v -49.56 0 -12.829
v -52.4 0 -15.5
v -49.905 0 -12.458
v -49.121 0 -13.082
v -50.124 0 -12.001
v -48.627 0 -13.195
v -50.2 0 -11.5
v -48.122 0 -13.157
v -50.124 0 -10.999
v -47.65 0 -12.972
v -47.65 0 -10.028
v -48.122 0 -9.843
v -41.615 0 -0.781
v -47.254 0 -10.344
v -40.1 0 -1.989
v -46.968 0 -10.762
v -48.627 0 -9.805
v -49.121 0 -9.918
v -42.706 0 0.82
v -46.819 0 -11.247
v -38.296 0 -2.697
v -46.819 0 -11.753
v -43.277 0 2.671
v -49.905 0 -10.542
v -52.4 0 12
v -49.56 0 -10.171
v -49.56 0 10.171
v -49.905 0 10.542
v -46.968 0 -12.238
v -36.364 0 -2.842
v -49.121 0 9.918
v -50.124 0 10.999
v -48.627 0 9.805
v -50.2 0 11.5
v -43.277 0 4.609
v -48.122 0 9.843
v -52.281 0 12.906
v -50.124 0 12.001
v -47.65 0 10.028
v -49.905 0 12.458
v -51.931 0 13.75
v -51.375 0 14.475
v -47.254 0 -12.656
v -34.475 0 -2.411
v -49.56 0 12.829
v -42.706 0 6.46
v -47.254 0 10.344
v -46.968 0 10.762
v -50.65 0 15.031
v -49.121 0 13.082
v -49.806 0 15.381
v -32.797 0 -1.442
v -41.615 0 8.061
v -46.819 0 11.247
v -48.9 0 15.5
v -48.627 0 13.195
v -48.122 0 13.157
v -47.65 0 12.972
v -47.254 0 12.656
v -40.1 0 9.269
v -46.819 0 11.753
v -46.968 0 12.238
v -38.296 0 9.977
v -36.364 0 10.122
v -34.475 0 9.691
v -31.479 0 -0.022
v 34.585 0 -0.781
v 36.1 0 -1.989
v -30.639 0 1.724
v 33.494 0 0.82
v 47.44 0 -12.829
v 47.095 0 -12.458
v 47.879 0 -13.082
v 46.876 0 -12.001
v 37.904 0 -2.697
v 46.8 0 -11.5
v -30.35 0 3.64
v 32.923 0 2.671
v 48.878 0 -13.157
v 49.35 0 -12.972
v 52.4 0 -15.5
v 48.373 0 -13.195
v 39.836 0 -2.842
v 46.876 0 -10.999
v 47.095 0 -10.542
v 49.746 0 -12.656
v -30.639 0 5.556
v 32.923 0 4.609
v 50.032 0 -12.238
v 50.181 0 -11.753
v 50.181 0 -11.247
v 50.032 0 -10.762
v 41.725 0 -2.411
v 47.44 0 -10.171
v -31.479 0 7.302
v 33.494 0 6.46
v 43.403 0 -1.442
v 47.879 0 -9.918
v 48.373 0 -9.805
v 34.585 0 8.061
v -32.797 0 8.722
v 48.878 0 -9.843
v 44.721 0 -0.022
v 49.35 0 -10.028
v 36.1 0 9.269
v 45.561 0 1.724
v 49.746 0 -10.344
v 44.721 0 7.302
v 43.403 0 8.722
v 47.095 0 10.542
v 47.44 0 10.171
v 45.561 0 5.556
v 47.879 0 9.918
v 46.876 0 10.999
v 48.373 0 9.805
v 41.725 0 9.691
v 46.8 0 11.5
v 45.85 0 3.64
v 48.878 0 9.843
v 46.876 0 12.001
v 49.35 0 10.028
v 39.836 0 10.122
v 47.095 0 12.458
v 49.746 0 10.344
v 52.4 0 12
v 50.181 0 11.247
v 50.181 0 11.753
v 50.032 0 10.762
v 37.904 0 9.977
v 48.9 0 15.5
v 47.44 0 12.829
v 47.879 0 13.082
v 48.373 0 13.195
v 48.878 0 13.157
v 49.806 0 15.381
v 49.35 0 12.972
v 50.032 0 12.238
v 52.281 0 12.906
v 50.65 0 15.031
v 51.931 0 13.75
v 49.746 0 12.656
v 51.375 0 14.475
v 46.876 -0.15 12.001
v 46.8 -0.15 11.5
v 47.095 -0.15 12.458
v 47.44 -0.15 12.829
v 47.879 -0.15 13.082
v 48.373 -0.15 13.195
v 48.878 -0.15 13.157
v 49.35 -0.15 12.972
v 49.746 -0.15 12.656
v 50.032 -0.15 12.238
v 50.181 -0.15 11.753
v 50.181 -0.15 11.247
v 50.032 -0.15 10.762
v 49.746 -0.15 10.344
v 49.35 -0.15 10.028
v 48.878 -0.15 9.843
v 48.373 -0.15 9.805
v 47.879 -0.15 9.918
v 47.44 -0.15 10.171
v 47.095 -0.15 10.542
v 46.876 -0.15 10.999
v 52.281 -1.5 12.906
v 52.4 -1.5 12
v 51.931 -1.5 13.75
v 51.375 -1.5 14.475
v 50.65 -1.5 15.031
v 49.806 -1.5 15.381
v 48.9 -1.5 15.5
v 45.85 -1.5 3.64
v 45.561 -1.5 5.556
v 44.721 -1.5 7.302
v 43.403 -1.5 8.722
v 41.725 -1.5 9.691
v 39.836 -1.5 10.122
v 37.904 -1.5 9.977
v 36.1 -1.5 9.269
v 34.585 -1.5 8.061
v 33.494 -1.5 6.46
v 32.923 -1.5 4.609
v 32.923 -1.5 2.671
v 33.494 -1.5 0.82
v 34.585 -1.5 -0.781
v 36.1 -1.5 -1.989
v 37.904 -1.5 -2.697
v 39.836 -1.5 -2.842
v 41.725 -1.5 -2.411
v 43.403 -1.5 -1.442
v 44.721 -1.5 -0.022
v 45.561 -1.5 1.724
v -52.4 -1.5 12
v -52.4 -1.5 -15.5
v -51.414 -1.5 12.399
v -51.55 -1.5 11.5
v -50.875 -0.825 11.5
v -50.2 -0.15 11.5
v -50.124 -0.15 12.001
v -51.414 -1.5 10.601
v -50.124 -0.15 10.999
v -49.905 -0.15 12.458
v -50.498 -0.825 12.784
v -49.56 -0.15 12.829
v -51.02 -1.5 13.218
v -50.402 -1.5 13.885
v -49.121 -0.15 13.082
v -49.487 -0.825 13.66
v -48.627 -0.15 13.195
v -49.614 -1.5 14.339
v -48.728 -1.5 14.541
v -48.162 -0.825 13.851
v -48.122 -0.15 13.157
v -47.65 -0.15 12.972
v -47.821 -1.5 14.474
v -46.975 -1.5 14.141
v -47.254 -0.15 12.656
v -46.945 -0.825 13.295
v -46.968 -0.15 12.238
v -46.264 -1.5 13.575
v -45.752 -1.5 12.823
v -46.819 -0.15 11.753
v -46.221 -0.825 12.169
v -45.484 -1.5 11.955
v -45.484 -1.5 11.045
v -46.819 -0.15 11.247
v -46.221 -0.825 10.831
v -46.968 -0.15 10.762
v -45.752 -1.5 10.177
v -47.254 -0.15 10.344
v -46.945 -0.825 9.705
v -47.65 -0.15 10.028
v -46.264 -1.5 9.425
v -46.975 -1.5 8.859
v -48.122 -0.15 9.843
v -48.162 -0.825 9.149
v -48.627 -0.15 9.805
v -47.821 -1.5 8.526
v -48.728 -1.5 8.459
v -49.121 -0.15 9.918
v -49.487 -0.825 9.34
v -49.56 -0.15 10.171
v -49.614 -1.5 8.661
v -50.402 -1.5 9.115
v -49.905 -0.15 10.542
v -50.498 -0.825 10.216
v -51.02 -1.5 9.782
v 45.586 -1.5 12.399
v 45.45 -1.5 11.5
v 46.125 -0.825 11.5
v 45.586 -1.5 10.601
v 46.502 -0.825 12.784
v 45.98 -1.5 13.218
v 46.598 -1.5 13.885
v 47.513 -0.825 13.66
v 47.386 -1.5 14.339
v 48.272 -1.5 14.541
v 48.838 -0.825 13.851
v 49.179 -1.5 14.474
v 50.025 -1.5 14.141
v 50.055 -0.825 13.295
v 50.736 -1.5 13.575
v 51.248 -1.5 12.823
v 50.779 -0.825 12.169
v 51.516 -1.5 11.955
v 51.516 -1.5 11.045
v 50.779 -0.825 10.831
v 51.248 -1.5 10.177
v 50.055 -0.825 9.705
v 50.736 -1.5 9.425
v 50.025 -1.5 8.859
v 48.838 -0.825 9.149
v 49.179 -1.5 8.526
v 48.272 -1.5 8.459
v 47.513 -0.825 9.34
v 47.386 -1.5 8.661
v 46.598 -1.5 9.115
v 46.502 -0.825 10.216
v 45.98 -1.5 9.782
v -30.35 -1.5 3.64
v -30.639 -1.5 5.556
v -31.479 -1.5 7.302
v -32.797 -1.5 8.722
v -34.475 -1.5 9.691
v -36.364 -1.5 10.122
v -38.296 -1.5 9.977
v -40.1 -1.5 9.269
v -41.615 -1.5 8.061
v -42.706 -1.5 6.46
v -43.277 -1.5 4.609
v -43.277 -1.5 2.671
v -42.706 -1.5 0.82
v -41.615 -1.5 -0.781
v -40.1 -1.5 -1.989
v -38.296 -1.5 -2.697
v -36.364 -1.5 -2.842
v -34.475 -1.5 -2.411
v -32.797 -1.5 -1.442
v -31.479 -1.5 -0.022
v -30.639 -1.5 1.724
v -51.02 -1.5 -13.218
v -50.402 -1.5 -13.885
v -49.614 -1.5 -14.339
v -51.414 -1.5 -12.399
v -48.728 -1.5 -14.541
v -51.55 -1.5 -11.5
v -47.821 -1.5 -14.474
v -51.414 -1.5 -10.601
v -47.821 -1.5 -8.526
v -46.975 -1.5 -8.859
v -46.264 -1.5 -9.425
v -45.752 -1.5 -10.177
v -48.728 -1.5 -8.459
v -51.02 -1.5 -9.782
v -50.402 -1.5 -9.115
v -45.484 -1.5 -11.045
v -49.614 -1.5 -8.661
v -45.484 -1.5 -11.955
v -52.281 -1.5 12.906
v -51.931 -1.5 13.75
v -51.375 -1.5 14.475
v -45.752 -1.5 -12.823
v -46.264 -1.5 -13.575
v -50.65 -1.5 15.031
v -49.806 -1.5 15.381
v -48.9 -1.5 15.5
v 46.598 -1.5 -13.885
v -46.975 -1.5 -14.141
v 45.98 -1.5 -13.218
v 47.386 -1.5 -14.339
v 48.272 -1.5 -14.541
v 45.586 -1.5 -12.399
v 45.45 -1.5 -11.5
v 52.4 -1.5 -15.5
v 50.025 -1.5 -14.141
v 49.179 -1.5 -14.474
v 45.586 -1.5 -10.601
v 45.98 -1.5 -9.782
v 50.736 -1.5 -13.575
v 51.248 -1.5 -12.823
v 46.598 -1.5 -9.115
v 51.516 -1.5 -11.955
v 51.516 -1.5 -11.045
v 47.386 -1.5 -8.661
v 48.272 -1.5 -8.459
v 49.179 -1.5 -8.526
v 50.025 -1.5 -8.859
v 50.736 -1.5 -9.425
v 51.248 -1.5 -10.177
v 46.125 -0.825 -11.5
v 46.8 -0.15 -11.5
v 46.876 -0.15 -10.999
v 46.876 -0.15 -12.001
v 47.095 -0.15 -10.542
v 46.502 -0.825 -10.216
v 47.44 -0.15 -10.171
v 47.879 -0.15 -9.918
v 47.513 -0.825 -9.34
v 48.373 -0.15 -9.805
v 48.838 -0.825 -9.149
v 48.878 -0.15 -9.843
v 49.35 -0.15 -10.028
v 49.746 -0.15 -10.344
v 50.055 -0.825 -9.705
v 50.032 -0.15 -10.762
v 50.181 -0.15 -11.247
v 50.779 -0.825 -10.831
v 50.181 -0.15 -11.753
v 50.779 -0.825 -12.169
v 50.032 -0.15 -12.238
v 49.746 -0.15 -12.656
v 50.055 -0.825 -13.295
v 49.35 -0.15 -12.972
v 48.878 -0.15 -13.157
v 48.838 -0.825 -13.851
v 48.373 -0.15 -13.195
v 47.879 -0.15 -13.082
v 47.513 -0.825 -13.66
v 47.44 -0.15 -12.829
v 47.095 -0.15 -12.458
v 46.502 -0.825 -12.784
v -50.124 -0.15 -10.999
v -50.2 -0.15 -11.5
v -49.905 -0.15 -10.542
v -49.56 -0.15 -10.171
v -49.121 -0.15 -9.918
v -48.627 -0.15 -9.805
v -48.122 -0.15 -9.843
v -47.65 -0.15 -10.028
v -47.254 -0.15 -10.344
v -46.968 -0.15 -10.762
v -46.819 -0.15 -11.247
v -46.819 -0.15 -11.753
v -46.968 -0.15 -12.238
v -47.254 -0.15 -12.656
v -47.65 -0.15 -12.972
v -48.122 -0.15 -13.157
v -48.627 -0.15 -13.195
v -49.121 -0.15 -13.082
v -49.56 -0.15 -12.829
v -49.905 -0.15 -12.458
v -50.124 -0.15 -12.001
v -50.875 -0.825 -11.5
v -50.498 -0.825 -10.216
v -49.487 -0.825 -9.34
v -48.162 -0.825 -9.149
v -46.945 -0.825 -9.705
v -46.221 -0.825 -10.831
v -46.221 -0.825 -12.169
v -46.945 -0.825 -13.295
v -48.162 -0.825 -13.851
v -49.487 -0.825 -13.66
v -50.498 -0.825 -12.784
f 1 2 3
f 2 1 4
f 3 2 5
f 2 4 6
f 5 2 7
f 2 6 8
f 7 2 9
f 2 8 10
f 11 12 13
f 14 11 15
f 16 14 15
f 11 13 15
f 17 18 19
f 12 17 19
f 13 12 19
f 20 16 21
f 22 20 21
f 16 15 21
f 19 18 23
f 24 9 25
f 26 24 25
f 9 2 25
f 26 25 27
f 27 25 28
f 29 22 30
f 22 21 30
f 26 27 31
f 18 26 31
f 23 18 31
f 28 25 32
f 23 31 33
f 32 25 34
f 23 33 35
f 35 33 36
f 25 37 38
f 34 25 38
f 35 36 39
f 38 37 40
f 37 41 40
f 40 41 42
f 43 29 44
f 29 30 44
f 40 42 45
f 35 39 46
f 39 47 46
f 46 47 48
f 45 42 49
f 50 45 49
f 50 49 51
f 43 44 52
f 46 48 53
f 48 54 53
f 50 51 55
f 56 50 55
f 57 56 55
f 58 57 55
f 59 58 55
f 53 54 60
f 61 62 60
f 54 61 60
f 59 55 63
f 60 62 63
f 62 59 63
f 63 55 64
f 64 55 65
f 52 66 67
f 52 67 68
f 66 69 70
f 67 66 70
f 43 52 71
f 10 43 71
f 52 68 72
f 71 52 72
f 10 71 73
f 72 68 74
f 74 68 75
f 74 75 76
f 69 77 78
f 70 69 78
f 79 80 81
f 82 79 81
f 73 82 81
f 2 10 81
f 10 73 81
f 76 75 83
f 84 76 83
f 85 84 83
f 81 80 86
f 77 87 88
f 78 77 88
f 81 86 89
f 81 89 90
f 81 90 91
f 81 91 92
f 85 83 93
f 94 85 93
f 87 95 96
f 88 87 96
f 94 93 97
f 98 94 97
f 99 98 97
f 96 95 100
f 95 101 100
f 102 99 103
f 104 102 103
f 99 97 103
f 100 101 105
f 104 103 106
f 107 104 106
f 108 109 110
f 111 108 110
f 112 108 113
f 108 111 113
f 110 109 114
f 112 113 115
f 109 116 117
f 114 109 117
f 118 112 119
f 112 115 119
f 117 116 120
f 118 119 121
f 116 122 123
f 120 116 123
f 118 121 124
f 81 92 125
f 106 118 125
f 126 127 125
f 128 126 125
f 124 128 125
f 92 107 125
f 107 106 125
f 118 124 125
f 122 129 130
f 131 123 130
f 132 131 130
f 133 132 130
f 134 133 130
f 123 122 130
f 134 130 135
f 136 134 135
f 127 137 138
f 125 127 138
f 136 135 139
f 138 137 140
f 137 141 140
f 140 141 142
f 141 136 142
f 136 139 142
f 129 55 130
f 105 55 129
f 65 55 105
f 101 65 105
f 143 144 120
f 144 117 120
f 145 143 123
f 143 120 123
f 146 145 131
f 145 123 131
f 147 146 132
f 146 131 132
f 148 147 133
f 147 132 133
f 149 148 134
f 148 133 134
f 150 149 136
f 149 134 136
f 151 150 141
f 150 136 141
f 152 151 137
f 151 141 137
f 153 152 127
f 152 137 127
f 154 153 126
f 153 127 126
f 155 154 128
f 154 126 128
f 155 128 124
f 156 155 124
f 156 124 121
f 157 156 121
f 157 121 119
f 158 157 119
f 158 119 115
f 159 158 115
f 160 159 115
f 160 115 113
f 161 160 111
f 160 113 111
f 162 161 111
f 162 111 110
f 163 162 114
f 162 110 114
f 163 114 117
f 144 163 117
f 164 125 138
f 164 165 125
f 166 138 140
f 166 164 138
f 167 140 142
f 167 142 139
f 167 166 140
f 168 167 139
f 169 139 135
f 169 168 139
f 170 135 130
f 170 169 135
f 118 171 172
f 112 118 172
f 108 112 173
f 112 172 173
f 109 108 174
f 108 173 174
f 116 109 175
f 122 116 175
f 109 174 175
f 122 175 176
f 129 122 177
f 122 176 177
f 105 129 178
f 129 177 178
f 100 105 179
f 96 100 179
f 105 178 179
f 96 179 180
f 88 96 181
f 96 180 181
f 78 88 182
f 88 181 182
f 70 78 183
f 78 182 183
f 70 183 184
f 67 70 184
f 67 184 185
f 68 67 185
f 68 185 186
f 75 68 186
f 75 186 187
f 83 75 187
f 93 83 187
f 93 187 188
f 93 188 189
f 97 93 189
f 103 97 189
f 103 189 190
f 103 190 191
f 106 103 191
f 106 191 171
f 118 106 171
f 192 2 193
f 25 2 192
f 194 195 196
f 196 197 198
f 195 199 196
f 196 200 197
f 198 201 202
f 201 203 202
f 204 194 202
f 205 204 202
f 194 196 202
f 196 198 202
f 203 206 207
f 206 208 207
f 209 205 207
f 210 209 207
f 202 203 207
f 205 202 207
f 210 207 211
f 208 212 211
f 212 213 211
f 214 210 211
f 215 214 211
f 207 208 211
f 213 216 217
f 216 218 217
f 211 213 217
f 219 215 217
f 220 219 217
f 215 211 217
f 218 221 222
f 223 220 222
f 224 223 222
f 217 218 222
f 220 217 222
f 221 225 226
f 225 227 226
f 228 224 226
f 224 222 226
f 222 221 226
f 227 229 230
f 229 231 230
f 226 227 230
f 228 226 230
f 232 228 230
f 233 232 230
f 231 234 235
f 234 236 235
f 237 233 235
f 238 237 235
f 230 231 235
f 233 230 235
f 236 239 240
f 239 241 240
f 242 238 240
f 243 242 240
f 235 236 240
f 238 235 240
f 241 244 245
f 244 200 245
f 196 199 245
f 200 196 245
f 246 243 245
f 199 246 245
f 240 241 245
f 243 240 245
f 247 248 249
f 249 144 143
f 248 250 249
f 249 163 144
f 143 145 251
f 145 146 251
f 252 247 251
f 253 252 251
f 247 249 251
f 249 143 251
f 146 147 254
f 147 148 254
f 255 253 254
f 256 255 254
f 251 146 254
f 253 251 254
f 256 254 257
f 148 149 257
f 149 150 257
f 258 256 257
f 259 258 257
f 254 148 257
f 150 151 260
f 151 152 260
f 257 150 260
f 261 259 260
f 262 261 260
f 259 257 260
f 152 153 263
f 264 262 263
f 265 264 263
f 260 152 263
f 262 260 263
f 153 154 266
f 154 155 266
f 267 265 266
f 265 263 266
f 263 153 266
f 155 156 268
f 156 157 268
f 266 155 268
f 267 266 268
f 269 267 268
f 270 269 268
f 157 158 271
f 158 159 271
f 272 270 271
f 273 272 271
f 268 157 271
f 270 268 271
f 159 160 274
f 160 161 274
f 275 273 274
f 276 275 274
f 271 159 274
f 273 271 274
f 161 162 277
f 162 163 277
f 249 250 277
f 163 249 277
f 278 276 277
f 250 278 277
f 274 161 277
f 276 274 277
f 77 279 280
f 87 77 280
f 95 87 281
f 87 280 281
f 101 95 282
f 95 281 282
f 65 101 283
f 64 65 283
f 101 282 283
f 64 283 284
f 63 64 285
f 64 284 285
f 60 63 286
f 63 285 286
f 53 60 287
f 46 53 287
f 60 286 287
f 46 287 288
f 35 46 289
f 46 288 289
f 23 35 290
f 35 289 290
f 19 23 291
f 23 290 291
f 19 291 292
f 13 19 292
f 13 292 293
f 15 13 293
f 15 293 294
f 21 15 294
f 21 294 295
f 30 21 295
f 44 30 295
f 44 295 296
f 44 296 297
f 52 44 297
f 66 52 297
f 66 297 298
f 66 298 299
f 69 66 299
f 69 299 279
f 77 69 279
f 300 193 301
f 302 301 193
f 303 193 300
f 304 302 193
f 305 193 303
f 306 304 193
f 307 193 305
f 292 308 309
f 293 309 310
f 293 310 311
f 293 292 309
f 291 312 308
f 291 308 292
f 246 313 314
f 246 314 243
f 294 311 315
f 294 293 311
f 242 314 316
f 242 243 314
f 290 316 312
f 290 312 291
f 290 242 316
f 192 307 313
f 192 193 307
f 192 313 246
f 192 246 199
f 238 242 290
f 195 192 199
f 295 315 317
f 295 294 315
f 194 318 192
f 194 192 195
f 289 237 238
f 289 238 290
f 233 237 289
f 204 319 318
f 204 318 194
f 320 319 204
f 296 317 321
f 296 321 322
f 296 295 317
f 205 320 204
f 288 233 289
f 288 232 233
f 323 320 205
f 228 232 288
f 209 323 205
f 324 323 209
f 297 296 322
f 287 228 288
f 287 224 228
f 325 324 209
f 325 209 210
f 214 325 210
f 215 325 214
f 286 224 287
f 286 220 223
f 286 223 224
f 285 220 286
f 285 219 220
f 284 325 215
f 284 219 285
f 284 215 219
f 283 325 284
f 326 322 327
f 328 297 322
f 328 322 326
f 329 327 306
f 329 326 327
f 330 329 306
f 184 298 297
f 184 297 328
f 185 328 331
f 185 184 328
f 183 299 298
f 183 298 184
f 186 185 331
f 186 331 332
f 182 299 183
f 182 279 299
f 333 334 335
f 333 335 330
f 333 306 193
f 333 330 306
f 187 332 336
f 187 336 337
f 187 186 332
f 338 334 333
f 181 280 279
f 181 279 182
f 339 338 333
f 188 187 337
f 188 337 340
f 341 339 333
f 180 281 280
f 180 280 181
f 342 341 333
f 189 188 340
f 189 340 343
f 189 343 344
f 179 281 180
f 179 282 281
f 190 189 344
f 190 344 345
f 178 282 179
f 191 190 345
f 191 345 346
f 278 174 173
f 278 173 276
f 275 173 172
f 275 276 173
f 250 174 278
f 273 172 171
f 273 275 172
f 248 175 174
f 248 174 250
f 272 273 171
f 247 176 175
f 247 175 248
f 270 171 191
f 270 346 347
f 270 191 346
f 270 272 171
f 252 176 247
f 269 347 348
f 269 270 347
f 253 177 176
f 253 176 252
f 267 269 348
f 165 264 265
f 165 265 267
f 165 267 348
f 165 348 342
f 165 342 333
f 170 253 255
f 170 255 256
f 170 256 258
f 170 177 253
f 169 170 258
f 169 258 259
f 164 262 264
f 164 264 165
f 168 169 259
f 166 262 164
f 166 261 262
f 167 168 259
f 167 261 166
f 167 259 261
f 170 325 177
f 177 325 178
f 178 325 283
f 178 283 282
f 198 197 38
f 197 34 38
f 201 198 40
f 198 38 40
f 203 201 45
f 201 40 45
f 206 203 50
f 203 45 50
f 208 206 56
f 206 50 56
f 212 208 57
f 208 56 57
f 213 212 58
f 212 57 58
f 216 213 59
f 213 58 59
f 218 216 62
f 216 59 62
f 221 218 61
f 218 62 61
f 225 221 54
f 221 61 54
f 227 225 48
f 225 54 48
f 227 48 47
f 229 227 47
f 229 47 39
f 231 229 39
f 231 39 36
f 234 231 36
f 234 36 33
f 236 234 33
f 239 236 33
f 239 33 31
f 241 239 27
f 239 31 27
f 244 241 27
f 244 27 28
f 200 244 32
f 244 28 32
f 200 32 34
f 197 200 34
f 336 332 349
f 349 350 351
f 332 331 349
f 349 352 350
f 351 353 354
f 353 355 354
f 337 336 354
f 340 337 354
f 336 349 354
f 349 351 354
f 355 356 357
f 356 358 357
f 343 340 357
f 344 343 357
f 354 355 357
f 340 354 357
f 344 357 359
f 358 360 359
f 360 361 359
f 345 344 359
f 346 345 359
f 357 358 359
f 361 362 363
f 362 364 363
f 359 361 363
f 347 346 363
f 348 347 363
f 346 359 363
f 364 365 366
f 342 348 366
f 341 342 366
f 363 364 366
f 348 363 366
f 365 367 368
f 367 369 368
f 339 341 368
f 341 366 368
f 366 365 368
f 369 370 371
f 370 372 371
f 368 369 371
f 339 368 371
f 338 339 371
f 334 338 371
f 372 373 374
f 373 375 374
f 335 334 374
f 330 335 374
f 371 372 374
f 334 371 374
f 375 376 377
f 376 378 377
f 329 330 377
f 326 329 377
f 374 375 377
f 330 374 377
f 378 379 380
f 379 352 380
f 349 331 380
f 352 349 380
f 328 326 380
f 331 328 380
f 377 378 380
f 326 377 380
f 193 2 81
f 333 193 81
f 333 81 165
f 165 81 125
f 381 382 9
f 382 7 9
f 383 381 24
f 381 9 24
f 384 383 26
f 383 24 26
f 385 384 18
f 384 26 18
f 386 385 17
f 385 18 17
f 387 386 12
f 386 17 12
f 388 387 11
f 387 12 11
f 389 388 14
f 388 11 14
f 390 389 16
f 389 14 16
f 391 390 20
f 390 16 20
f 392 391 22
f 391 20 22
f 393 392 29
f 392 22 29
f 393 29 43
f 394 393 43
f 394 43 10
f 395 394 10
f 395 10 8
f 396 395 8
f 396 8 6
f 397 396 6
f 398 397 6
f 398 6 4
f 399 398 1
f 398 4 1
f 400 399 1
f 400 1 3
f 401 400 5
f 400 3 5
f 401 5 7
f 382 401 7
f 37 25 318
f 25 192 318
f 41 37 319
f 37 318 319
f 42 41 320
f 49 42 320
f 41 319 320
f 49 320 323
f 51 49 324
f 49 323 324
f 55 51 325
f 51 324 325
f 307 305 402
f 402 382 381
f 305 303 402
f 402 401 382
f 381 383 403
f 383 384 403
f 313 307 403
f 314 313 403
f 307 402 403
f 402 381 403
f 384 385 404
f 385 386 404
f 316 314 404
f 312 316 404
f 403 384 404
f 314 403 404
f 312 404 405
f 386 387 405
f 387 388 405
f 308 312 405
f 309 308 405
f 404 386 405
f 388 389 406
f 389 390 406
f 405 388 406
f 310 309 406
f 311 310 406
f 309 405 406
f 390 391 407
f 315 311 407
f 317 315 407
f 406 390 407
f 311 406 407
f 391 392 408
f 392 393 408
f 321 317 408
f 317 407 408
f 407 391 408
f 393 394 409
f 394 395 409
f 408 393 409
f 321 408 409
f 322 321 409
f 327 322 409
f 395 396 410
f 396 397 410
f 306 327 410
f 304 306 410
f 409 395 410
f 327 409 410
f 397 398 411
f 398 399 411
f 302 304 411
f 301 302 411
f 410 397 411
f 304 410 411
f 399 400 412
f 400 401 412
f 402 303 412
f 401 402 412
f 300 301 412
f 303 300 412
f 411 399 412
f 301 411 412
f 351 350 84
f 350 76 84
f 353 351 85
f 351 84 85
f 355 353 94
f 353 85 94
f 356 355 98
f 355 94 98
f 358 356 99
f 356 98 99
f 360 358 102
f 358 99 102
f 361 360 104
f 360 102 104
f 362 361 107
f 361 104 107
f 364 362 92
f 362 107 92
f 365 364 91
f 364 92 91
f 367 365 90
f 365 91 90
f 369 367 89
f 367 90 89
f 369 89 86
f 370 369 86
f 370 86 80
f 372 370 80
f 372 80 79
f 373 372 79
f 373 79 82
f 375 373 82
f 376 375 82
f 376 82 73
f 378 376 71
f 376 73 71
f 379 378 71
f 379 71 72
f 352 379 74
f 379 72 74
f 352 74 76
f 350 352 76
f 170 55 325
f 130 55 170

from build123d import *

# Parameters (mm, degrees)
SKETCH_W            = 104.8
SKETCH_H            = 31
PAD_DEPTH           = 1.5
HOLE_D              = 3.4
HOLE_DEPTH          = 25
HOLE_CSINK_D        = 6.1
HOLE_CSINK_ANGLE    = 90
FILLET_R            = 3.5
SKETCH002_R         = 6.5
POCKET_DEPTH        = 1.501
LINEARPATTERN_COUNT = 2
LINEARPATTERN_PITCH = 76.2


with BuildPart() as part:
    # Sketch → Pad (new body)
    with BuildSketch(Plane.XZ):
        Rectangle(SKETCH_W, SKETCH_H)
    extrude(amount=PAD_DEPTH)

    # Hole
    with Locations(Plane.XZ.offset(1.5)):
        with Locations((-48.5, 11.5), (-48.5, -11.5), (48.5, -11.5), (48.5, 11.5)):
            CounterSinkHole(HOLE_D / 2, HOLE_CSINK_D / 2, depth=HOLE_DEPTH, counter_sink_angle=HOLE_CSINK_ANGLE)

    # Fillet
    fillet_edges = [part.edges().sort_by_distance(p)[0] for p in [
        (-52.4, -0.75, 15.5),
        (52.4, -0.75, 15.5),
    ]]
    fillet(fillet_edges, radius=FILLET_R)

    # Sketch002 (on Face5 of Fillet) → Pocket (cut, through all)
    with BuildSketch(Plane.XZ.offset(1.5)):
        with Locations((-36.85, 3.64)):
            Circle(SKETCH002_R)
    pocket = extrude(amount=-POCKET_DEPTH, mode=Mode.SUBTRACT)

    # LinearPattern: Pocket ×2
    with Locations(*[(i * LINEARPATTERN_PITCH, 0, 0) for i in range(1, LINEARPATTERN_COUNT)]):
        add(pocket, mode=Mode.SUBTRACT)


solid = part.part
